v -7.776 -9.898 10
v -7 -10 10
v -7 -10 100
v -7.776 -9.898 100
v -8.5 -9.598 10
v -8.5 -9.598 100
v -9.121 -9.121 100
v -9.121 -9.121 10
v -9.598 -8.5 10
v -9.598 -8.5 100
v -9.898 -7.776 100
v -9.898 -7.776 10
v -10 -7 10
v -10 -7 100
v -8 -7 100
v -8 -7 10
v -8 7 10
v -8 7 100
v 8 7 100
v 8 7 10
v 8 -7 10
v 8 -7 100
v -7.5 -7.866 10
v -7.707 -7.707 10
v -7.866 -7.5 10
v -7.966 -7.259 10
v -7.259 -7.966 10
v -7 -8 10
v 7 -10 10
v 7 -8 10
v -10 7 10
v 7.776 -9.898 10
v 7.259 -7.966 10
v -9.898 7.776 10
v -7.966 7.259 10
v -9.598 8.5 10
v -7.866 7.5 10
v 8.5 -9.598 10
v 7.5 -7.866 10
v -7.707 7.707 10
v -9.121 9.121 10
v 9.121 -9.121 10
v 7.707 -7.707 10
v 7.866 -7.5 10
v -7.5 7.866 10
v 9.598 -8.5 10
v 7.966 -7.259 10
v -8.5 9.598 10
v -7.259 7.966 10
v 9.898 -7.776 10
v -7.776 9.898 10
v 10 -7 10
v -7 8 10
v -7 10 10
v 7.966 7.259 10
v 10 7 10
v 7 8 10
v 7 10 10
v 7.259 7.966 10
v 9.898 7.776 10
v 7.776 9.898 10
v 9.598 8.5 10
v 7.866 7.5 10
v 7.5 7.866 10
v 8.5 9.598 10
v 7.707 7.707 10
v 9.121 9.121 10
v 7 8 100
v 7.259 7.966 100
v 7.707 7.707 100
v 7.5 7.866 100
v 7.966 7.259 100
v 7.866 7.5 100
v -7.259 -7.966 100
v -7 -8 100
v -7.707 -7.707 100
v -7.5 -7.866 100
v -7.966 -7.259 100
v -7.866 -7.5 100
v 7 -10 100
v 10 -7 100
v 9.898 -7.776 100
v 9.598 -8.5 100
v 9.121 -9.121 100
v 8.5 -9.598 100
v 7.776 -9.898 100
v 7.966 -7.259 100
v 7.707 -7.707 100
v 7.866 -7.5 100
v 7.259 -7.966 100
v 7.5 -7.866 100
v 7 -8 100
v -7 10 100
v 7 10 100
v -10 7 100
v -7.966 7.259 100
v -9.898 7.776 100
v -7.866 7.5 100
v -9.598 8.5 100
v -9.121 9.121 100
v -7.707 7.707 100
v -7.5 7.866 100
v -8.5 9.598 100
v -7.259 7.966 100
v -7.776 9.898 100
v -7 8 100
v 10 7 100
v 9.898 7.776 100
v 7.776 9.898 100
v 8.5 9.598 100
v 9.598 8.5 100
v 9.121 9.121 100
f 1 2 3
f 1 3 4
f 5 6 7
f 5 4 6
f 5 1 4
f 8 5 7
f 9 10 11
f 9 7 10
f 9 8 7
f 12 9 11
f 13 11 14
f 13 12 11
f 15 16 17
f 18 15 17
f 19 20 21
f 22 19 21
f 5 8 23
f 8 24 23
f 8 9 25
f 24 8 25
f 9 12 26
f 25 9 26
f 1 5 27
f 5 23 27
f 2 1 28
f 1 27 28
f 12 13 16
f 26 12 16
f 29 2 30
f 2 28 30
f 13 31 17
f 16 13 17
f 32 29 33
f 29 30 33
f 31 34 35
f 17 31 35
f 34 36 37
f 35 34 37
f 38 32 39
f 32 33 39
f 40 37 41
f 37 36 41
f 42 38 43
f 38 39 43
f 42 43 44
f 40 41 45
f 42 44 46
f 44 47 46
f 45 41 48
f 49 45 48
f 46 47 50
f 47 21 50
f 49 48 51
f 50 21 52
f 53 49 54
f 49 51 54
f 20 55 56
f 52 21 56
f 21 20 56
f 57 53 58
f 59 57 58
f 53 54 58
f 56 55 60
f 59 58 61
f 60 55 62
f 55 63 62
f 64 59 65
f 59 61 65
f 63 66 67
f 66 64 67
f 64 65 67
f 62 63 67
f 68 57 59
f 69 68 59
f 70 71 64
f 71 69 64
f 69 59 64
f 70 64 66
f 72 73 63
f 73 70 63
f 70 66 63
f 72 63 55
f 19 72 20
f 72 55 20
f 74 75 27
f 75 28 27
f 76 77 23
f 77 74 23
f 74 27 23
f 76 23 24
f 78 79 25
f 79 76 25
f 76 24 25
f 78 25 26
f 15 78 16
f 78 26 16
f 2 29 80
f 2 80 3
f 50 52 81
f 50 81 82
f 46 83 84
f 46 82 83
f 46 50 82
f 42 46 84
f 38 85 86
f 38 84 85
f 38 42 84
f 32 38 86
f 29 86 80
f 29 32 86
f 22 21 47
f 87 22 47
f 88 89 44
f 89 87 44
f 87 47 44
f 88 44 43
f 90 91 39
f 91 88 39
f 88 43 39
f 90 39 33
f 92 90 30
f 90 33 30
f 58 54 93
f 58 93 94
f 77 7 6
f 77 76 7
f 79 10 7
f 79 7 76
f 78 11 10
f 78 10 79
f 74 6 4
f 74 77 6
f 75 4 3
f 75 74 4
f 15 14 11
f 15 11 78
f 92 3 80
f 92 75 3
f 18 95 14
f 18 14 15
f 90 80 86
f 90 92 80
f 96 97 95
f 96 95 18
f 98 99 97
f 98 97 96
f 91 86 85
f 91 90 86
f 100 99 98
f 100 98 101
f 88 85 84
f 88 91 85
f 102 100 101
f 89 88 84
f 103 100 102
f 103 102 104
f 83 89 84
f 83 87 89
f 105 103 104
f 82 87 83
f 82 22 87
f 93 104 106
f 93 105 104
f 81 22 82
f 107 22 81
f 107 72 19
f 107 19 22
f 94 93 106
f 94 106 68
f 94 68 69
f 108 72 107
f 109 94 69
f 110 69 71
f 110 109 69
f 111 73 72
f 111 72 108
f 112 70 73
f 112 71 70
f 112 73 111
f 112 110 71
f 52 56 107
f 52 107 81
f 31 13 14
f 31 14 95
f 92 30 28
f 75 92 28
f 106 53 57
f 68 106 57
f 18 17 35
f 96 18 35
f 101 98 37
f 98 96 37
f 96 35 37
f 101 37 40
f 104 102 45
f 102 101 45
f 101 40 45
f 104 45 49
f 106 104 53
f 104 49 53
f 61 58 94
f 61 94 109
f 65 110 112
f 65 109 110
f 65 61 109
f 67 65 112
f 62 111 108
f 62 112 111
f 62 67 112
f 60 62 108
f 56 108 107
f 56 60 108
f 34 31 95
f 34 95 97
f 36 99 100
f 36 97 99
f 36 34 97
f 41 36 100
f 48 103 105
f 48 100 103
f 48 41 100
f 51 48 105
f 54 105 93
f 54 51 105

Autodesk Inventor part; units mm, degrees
ref_plane "Start Plane" through (0, 0, 10) normal (0, 0, 1) x (1, 0, 0)
ref_plane "End Plane" through (0, 0, 100) normal (0, 0, 1) x (1, 0, 0)
sketch "Sketch" plane through (0, 0, 0) normal (0, 0, 1) x (1, 0, 0)
  line L0 (-10, -7) -> (-10, 7)
  line L1 (-7, 10) -> (7, 10)
  line L2 (10, 7) -> (10, -7)
  line L3 (7, -10) -> (-7, -10)
  arc A0 (-10, -7) -> (-7, -10) centre (-7, -7) ccw
  arc A1 (-7, 10) -> (-10, 7) centre (-7, 7) ccw
  arc A2 (10, 7) -> (7, 10) centre (7, 7) ccw
  arc A3 (7, -10) -> (10, -7) centre (7, -7) ccw
  arc A4 (-7, 8) -> (-8, 7) centre (-7, 7) ccw
  line L4 (-7, 8) -> (7, 8)
  arc A5 (8, 7) -> (7, 8) centre (7, 7) ccw
  line L5 (8, 7) -> (8, -7)
  arc A6 (7, -8) -> (8, -7) centre (7, -7) ccw
  line L6 (7, -8) -> (-7, -8)
  arc A7 (-8, -7) -> (-7, -8) centre (-7, -7) ccw
  line L7 (-8, -7) -> (-8, 7)
  line L8 (0, 14.8698) -> (0, -14.8698) construction
  line L9 (-14.8698, 0) -> (14.8698, 0) construction
  dimension "d7" = 3
  dimension "d10" = 20
  dimension "d11" = 20
  dimension "d12" = 2
  dimension "d15" = 10
  dimension "d16" = 10
extrude "Body" add sketch "Sketch" along normal up to surface (90 mm away) from surface at 10
sketch "Sketch3" plane through (0, 0, 0) normal (0, 0, 1) x (1, 0, 0)
  line L0 (0, 0) -> (10, 0)
ref_plane "Work Plane3" through (0, 0, 0) normal (0, -1, 0) x (1, 0, 0)
sketch "Sketch4" plane through (0, 0, 0) normal (0, -1, 0) x (1, 0, 0)
  line L0 (-2, 10) -> (12, 10)
  line L1 (-2, 100) -> (12, 100)
  dimension "d18" = 90
ref_plane "Work Plane4" through (0, 0, 10) normal (0, 0, -1) x (-1, 0, 0)
split "Split1" plane through (0, 0, 10) removes the side toward (0, 0, -1)
ref_plane "Work Plane5" through (0, 0, 100) normal (0, 0, 1) x (1, 0, 0)
split "Split2" plane through (0, 0, 100) removes the side toward (0, 0, 1)
equation "\"d7\" = G_IR"
equation "\"d10\" = G_H"
equation "\"d11\" = G_W"
equation "\"d12\" = G_T"
equation "\"d15\" = 0.5 * d10"
equation "\"d16\" = 0.5 * d11"
equation "\"d3\" = G_L"
equation "\"G_W\" = 20"
equation "\"G_H\" = 20"
equation "\"G_T\" = 2"
equation "\"G_IR\" = 3"
equation "\"G_L\" = d18"
properties part number "ISO 12633-2 - 20x20x2 - 90" material "Steel, Mild"
